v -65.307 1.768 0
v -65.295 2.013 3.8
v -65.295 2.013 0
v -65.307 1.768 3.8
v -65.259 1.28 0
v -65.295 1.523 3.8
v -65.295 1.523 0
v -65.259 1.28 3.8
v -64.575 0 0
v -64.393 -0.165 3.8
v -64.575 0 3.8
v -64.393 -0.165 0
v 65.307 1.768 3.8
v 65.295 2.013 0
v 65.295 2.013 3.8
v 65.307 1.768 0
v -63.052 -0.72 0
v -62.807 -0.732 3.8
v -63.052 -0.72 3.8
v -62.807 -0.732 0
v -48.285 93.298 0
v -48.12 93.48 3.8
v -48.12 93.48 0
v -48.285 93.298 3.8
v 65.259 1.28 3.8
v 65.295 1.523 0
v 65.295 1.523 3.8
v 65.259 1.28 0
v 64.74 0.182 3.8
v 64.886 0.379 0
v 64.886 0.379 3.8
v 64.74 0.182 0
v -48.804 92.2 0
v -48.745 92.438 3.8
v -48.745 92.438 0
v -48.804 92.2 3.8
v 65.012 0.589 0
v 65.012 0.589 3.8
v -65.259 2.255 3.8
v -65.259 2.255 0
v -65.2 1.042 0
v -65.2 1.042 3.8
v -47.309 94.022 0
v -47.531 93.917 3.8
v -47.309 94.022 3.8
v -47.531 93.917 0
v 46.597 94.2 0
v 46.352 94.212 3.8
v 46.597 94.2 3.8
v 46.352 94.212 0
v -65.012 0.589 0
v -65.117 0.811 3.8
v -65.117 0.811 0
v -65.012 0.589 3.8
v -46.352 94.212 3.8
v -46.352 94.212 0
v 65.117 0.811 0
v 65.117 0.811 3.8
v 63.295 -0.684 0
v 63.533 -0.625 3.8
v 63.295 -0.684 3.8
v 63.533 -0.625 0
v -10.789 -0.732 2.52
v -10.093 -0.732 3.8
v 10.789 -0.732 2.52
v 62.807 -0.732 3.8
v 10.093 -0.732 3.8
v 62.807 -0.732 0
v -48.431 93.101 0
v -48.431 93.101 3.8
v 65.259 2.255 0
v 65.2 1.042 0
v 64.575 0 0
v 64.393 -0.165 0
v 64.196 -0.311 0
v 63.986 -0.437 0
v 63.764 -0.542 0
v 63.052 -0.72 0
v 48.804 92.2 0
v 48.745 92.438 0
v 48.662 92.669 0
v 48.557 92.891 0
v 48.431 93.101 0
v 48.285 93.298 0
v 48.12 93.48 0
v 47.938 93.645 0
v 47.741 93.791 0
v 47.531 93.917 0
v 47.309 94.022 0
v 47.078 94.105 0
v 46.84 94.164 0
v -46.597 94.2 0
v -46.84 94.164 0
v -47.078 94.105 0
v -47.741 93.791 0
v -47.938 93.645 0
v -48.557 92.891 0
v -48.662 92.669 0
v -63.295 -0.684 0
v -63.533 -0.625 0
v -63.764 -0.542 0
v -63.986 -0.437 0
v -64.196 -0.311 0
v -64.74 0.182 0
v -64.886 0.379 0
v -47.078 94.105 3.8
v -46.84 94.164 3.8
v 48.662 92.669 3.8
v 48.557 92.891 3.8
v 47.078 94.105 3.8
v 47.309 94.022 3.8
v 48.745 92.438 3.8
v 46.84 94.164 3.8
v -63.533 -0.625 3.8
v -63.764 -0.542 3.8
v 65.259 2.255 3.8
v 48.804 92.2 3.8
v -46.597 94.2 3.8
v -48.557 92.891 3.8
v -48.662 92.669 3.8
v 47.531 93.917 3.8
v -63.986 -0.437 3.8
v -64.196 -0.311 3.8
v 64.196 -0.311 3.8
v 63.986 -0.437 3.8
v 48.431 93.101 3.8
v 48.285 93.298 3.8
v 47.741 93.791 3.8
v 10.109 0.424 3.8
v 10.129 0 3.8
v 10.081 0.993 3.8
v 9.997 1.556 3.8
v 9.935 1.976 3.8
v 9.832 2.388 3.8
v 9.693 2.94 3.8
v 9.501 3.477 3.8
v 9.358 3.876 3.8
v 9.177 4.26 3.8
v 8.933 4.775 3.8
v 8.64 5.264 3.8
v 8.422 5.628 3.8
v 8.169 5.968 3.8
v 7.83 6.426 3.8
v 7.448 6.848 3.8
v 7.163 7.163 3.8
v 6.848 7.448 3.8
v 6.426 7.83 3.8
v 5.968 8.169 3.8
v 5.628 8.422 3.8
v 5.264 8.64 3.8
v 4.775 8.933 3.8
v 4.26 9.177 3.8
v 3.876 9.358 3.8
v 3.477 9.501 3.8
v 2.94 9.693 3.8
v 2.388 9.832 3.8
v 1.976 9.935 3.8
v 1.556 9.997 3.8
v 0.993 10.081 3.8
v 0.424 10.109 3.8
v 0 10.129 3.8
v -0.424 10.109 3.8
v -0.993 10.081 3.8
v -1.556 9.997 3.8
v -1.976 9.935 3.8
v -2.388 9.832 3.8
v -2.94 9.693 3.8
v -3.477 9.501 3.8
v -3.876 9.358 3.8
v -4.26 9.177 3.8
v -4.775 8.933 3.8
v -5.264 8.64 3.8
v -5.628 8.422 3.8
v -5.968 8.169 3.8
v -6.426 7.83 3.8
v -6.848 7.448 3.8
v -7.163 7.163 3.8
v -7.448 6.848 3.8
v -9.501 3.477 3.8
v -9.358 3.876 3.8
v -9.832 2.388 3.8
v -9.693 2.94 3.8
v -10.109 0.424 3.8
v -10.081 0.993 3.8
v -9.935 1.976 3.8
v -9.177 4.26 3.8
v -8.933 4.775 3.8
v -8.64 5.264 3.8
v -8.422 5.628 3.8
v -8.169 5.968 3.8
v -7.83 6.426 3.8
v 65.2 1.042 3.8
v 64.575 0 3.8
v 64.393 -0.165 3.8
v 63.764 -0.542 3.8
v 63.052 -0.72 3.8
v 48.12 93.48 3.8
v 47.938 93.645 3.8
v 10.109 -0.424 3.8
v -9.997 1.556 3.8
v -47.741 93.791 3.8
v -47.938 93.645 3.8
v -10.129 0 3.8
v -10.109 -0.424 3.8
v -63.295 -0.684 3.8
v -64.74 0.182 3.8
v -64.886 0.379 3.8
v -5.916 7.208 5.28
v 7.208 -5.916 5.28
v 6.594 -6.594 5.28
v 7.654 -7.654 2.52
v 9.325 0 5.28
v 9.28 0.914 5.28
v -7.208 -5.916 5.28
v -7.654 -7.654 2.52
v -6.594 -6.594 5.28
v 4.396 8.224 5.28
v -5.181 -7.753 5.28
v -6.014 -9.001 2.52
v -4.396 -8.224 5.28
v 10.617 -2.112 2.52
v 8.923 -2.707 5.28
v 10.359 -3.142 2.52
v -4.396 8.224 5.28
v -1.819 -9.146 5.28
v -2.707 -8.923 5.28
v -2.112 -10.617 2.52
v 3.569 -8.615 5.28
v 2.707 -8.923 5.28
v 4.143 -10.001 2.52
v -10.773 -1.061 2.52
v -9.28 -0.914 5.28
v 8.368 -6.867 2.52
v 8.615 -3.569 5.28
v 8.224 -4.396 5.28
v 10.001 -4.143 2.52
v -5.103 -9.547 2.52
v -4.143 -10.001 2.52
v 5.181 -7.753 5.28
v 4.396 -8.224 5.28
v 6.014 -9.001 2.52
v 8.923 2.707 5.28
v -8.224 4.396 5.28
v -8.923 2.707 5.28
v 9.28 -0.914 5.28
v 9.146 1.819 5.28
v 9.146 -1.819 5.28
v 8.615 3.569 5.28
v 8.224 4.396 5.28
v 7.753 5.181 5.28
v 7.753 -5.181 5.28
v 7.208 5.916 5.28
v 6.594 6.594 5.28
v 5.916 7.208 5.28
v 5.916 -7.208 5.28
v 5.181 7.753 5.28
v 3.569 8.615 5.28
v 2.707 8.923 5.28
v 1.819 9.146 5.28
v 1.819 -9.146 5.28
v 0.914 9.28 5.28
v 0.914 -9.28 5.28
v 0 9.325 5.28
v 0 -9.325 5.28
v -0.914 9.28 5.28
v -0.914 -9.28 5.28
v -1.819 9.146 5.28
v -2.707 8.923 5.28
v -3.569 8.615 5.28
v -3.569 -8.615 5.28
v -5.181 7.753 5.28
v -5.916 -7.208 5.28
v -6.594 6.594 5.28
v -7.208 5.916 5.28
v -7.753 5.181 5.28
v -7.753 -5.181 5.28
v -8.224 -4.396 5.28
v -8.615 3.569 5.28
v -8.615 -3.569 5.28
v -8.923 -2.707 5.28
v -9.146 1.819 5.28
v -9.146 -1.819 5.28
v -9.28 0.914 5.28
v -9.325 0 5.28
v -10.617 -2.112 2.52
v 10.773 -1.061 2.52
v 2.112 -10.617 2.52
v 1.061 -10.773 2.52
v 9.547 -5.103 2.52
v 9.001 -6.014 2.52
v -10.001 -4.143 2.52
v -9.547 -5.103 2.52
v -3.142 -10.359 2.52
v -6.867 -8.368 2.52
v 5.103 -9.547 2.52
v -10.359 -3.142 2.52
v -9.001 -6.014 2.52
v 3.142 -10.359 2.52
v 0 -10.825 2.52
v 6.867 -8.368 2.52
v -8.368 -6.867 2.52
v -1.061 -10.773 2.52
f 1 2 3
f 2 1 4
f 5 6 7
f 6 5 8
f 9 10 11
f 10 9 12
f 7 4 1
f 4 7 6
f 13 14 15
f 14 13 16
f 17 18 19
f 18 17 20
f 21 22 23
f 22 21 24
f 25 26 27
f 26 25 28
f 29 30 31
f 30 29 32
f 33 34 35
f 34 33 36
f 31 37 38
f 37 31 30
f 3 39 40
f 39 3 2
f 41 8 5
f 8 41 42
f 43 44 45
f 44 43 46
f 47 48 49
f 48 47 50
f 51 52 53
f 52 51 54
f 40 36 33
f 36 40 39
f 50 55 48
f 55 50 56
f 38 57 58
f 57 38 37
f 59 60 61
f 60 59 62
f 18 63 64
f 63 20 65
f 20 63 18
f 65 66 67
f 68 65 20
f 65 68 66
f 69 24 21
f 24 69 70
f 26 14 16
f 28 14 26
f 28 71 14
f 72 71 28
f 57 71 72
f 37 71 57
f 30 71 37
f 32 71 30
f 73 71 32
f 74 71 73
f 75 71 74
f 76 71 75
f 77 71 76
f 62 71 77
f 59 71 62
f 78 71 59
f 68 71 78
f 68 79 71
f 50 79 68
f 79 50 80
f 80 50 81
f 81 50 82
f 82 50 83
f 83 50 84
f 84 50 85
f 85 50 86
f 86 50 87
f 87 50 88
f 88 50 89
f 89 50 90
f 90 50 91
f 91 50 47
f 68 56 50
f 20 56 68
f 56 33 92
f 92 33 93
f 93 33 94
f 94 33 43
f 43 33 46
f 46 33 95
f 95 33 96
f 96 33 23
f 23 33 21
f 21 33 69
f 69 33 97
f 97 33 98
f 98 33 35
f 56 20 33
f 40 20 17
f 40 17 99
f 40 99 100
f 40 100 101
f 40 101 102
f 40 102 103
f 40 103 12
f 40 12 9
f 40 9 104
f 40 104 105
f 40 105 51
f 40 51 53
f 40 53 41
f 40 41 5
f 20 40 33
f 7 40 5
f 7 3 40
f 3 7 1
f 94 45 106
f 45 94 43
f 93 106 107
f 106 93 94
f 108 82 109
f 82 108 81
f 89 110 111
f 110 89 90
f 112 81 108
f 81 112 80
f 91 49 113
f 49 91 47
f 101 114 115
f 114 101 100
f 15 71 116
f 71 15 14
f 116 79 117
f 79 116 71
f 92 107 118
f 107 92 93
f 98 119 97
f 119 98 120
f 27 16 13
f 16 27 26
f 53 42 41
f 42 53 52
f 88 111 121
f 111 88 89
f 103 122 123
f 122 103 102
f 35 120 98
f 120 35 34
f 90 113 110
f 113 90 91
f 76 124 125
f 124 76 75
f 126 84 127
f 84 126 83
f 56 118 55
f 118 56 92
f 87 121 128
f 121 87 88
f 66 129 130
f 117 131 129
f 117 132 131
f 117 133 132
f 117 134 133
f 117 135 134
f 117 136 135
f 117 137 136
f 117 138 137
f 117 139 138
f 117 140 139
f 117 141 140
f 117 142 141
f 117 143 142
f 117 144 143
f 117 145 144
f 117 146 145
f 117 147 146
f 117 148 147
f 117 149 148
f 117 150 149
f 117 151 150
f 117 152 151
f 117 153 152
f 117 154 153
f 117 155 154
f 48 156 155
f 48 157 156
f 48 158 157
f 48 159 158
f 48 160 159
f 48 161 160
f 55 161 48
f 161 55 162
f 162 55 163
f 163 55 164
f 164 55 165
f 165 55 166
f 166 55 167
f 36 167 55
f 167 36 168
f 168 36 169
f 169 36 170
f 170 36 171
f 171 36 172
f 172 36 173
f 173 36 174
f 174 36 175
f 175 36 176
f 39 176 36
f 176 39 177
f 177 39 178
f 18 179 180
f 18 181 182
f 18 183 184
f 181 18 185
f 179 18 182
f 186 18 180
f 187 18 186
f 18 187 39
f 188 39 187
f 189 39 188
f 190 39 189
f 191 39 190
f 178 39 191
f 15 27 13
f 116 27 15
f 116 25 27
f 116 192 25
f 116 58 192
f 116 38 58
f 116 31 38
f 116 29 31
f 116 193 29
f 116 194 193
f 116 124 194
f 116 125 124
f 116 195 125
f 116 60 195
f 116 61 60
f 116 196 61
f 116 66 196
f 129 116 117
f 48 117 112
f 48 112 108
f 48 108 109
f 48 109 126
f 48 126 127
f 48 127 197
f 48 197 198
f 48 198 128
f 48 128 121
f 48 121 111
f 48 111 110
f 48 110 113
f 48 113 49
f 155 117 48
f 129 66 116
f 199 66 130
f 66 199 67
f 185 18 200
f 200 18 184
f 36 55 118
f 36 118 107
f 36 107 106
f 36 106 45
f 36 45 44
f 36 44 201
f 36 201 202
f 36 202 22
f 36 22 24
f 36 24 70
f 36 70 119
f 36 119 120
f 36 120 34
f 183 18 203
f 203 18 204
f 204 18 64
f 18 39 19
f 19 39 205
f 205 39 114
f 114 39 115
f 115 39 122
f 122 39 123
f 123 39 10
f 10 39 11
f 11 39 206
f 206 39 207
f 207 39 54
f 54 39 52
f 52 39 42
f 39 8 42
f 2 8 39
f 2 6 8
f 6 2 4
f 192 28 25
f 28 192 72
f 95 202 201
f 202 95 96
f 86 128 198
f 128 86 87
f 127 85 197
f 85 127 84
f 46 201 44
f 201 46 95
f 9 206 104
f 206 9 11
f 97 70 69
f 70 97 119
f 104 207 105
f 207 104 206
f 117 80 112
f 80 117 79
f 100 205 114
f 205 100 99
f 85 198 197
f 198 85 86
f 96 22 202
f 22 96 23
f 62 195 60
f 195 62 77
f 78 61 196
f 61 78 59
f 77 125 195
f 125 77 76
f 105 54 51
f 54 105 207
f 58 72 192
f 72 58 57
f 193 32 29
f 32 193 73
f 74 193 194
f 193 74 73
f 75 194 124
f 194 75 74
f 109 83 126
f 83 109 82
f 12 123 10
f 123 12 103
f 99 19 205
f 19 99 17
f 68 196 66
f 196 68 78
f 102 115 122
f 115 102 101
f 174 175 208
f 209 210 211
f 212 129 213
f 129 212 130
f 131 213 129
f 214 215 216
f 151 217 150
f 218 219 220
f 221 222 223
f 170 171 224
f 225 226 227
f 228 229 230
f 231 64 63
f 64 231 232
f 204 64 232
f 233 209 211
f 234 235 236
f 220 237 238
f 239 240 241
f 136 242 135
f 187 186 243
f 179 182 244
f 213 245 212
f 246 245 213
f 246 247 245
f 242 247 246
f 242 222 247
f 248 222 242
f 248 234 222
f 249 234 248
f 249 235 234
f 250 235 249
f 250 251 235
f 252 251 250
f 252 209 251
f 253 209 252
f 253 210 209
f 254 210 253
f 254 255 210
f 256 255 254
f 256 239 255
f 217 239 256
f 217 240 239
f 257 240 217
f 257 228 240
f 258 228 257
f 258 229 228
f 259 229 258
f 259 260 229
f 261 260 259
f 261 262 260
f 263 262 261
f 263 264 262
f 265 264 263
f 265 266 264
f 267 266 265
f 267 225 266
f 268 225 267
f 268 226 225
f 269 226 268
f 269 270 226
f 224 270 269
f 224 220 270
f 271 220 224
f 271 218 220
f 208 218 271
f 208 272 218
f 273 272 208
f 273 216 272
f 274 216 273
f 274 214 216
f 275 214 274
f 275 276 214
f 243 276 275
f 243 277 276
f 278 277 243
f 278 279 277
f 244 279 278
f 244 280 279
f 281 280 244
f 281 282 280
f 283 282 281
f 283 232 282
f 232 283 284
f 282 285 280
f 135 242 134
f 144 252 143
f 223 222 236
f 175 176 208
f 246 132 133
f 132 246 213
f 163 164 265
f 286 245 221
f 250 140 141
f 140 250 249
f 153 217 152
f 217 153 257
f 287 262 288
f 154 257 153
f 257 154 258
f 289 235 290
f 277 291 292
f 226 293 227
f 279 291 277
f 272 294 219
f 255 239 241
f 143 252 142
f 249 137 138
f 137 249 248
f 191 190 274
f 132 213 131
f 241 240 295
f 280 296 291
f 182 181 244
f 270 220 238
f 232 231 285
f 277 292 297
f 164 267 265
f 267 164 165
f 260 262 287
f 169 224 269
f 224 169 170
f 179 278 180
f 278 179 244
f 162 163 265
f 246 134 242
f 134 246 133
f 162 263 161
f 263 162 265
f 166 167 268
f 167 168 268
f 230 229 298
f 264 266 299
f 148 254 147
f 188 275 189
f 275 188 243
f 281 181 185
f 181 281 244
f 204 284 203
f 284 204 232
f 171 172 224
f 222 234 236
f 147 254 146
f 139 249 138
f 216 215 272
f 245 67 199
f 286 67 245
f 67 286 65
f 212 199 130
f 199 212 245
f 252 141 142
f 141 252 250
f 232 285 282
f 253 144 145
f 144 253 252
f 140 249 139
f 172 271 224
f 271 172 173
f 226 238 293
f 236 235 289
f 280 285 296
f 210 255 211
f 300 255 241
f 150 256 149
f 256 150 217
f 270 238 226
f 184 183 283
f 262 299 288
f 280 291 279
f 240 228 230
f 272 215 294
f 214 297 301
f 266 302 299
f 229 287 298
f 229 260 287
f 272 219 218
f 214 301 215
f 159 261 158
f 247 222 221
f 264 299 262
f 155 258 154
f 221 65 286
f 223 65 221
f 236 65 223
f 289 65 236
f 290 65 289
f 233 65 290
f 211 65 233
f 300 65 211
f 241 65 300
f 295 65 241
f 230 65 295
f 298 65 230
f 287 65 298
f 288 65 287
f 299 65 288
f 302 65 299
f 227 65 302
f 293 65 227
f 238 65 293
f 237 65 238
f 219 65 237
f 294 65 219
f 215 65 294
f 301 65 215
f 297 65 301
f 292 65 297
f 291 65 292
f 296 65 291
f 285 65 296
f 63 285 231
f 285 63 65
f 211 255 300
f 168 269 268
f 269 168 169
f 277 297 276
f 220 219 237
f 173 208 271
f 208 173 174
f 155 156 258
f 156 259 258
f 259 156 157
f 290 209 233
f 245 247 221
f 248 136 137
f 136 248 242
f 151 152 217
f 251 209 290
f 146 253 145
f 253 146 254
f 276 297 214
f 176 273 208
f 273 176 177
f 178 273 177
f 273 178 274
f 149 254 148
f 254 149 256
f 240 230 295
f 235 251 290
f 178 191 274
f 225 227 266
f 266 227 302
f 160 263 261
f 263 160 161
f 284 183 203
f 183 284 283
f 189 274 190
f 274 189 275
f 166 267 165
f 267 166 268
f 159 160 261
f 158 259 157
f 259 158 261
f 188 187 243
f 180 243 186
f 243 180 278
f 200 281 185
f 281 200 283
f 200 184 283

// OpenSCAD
// Parameters
// Forearm Width 1 (mm)
$fn = 64;

width1 = 129.15; //[45:175]

// Forearm Width 2 (mm)
width2 = 103.89; //[25:155]

// Forearm Length 1 (mm)
length1 = 118.16; //[35:165]

// Forearm Origin (mm)
origin = 0;

// Forearm Height (smallest) (mm)
heightSmall = 1.04; //[.75:1.25]

// Forearm Height (main) = 2.52 mm
heightMain = heightSmall*2.4231;

// SidePort Height
heightSidePort = 3.653846 * heightSmall;

// PegPortHeight
pegPortHeight = 5.077 * heightSmall;

 
// Diameter fillet (mm)
diameter = 5; //[3:7]


//Add the circle ports 
radius = 8.32; //[3:12]
yShift = 7; //[4:13]

//square cutout for circle ports
squareRad = 6.86; //[3:10]

//Diameter for ports connected to the end of the main shape (w/ square cutouts)
circDiam = 18.65; //[15:20]

//linear extrude of circle ports (mm)
//trying to put the variable in terms of height of the base of the trapezoid
circExtrude = heightSmall*5.07692307692;

// height of main quadrilateral
quadrilateralHeight = 3.80;

// peg-hole larger circle
pegHoleLargerCircleDiameter = 21.65;

// peg-hole smaller circle
pegHoleSmallerCircleDiameter = 18.65;

// distance between peg-hole large circle and small circle
pegHoleDistanceBetweenCircles = 5.28;

// height of connecting rectangle between main quadrilateral and pegHole




module fourCorners() {  // the 4 corners of the main plate of the forearm (before the two ports on top)
    
    fourCornersDiameter = 5;
    translate_amount = (fourCornersDiameter / 2) / sqrt(2);
    
    dist_from_y_axis = 48.12;   // distance of top left and right corners of polygon from y-axis
    
    dist_from_x_axis = 93.48;    // distance of top left and right corners of polygon from x-axis
    
    linear_extrude(height = quadrilateralHeight) {
    
        hull() {
            // bottom left
            translate([-width1/2 + translate_amount, origin + translate_amount]) circle(d=fourCornersDiameter, center = true);
            // bottom right
            translate([width1/2 - translate_amount, origin + translate_amount]) circle(d=fourCornersDiameter, center = true);
            // top left
            translate([-dist_from_y_axis + translate_amount, dist_from_x_axis - translate_amount]) circle(d=fourCornersDiameter, center = true);    
            // top right
            translate([dist_from_y_axis - translate_amount, dist_from_x_axis - translate_amount]) circle(d=fourCornersDiameter, center = true);
        }  
    }
    
}

module circleSquare(){
    
    /*
    hull() {
        // larger circle
        circle(d = pegHoleLargerCircleDiameter, center = true);

        // smaller circle
        translate([0, 0, pegHoleDistanceBetweenCircles]) circle(d = pegHoleSmallerCircleDiameter, center = true);
    } */
    
    // larger and smaller circles of pegHole hulled together
    translate([0, 0, heightMain + ((pegPortHeight - heightMain) / 2) ]) cylinder(h = pegPortHeight - heightMain,
             d1 = pegHoleLargerCircleDiameter,
             d2 = pegHoleSmallerCircleDiameter,
             center = true);
    
    
    /*
    hull(){
        color("blue") translate([x_coord,100,30]) square([18.65,18.65], center = true);

        translate([x_coord, 108.835,30]) circle(d=18.65, center = true);
    } 
    */
}

/*
module mainShape(){
difference() {
difference() {
difference() {
difference() {
    // Main shape
    linear_extrude(height=heightMain) {
        hull() { 
            translate([origin+diameter/2, origin+diameter/2]) circle(d=diameter);
            translate([width1-diameter/2, origin+diameter/2]) circle(d=diameter);
            translate([((width1 - width2) / 2 + width2) - diameter/2, length1-diameter/2]) circle(d=diameter);
            translate([((width1 - width2) / 2) + diameter/2, length1 - diameter/2]) circle(d=diameter);
            polygon(points=[
                [origin+diameter/2, origin+diameter/2],
                [width1-diameter/2, origin+diameter/2],
                [((width1 - width2) / 2 + width2) - diameter/2, length1-diameter/2],
                [((width1 - width2) / 2) + diameter/2, length1 - diameter/2]
            ]); 
        }
        // Adding slight raised parts over oval cutouts
    rotations_2 = [-5.5, 5.5];
    x_positions_2 = [0, width1 - 17]; 
    y_positions_2 = [0, -12]; 

    for (i = [0 : len(rotations_2) - 1]) {
    rotate(rotations_2[i]) { 
        translate([x_positions_2[i], y_positions_2[i]]) {
            cube([15.55, 84.64, heightMain + 1.28], center = false); 
        }
    }
}        // Adding slight raised parts over oval cutouts
    rotations_2 = [-5.5, 5.5];
    x_positions_2 = [0, width1 - 17]; 
    y_positions_2 = [0, -12]; 

    for (i = [0 : len(rotations_2) - 1]) {
    rotate(rotations_2[i]) { 
        translate([x_positions_2[i], y_positions_2[i]]) {
            cube([15.55, 84.64, heightMain + 1.28], center = false); 
        }
    }
}
    }
    
    

    // Arrays for cube positions and rotations
    rotations = [5.5, -5.5, 5.5, -5.5];
    x_positions = [
        0.92915214866 * width1,
        0.07742934572 * width1,
        0.92915214866 * width1,
        0.07742934572 * width1
    ];
    y_positions = [
        0.59241706161 * length1,
        0.67704807041 * length1,
        0.0846310088  * length1,
        0.1692620176  * length1
    ];

    // Subtracting cubes using a loop
    for (i = [0 : len(rotations) - 1]) {
        rotate(rotations[i]) {
            translate([x_positions[i], y_positions[i]]) {
                cube([5.35, 27.03, 3 * circExtrude], center = true);
            }
        }
    }

    // Base positions for semicircle cutouts
    x_base = 0.07742934572 * width1;
    y_base = 0.1692620176 * length1;

    // Arrays for semicircle cutout offsets
    x_offsets = [3.13, 107.21, 109.8, 0.61, 6.31, 8.9, 104.05, 101.4];
    y_offsets = [12.1, 14.7, -12, -14.1, 45.1, 72.1, 47.6, 74.92];

    // Subtracting semicircle cutouts  using a loop
    for (i = [0 : len(x_offsets) - 1]) {
        translate([x_base + x_offsets[i], y_base + y_offsets[i]]) {
            cylinder(h = 3 * circExtrude, r = 5.35 / 2);
        }
    }

    
    //NEED TO MAKE THIS SCALABLE
    // Subtracting the scaled sphere to create a cutout

    translate([width1 / 2 +.05, -12 + length1]) {

        scale([1.95, .5, 1]) { // Scaling in x, y, z directions
            sphere(r = 19.8, center = true);
        }
    }
    
}

}
// Rectangle segment cutout
linear_extrude(height=circExtrude)  
translate([width1-63,length1-2])
cube([50,20,3*circExtrude],true);
translate([width1-64.5,length1-2]){
cube([(length1/1.53),20,3*circExtrude],true);
    }
}
}
 ; 
//Need to still figure out exact location of these circle ports in relation to rest of body



//Circular ports on the end of the main shape
 module gauntletPegHole(){
//Right port
 module port(){
    difference() {
        union() {
            linear_extrude(height=circExtrude, center=false, scale=0.75) {
                circle(d=18.65);
            }
                cube([10, 10, 10], center=false);
            
                cylinder(h=10, r=5);
        }
        cube([1, 1, 1]);
        }

 //Left Port
 difference()
 {
linear_extrude(height=circExtrude)  
translate([(width1-width2)/1.4,length1])
circle(radius);
translate([(width1-width2)/1.4,length1]){
cube([squareRad,squareRad,3*circExtrude],true);
    }
    
}
;

topPortWidth = 13.54;
topPortLength = 36.43;
topPortHeight = 5.02;

topPortX = (width1-topPortWidth)/2;
topPortY = (length1-topPortLength)/2;

translate([topPortX,topPortY,heightSmall]){
cube([topPortWidth,topPortLength,topPortHeight]);

translate([topPortX/8-.5,topPortY-7,0]){
cylinder(topPortHeight,topPortWidth/2+.3,topPortWidth/2+.3);
}

}

b = 10;
h = 10;
w = 4;

//Start with an extruded triangle
translate([topPortX+topPortWidth/2,topPortY,heightSmall]){
rotate(a=[180,-90,0])
linear_extrude(height = topPortWidth, center = true, convexity = 10, twist = 0)
polygon(points=[[0,0],[topPortHeight,0],[0,b]], paths=[[0,1,2]]);

}

}




// outline code for the ports

module gauntletPegHole() {
    difference() {
            linear_extrude(height=circExtrude, center=false, scale=0.75) {circle(d=circDiam);}
            translate([0,0,circExtrude/2]){
        cube([squareRad,squareRad,circExtrude], center = true);
        }
        }
        }
 
// Rendering modules
translate([-width1/2,0,0]) mainShape();
translate([-41.12, length1-circDiam/2]) gauntletPegHole();
mirror([0,1,0]) { translate([-41.12, length1-circDiam/2]) gauntletPegHole();}

        union() {
            linear_extrude(height=3, center=false, scale=0.75) {
                circle(d=18.65);
            }
            translate([0, 0, 0]) {
                cube([10, 10, 10], center=true);
            }
            translate([0, 0, 0]) {
                cylinder(h=10, r=5);
            }
        }
        cube([20, 20, 20]);
    }
}



// Rendering modules
translate([-width1/2,0,0]) mainShape();
//gauntletPegHole();
*/

fourCorners();
color("red") circleSquare();
